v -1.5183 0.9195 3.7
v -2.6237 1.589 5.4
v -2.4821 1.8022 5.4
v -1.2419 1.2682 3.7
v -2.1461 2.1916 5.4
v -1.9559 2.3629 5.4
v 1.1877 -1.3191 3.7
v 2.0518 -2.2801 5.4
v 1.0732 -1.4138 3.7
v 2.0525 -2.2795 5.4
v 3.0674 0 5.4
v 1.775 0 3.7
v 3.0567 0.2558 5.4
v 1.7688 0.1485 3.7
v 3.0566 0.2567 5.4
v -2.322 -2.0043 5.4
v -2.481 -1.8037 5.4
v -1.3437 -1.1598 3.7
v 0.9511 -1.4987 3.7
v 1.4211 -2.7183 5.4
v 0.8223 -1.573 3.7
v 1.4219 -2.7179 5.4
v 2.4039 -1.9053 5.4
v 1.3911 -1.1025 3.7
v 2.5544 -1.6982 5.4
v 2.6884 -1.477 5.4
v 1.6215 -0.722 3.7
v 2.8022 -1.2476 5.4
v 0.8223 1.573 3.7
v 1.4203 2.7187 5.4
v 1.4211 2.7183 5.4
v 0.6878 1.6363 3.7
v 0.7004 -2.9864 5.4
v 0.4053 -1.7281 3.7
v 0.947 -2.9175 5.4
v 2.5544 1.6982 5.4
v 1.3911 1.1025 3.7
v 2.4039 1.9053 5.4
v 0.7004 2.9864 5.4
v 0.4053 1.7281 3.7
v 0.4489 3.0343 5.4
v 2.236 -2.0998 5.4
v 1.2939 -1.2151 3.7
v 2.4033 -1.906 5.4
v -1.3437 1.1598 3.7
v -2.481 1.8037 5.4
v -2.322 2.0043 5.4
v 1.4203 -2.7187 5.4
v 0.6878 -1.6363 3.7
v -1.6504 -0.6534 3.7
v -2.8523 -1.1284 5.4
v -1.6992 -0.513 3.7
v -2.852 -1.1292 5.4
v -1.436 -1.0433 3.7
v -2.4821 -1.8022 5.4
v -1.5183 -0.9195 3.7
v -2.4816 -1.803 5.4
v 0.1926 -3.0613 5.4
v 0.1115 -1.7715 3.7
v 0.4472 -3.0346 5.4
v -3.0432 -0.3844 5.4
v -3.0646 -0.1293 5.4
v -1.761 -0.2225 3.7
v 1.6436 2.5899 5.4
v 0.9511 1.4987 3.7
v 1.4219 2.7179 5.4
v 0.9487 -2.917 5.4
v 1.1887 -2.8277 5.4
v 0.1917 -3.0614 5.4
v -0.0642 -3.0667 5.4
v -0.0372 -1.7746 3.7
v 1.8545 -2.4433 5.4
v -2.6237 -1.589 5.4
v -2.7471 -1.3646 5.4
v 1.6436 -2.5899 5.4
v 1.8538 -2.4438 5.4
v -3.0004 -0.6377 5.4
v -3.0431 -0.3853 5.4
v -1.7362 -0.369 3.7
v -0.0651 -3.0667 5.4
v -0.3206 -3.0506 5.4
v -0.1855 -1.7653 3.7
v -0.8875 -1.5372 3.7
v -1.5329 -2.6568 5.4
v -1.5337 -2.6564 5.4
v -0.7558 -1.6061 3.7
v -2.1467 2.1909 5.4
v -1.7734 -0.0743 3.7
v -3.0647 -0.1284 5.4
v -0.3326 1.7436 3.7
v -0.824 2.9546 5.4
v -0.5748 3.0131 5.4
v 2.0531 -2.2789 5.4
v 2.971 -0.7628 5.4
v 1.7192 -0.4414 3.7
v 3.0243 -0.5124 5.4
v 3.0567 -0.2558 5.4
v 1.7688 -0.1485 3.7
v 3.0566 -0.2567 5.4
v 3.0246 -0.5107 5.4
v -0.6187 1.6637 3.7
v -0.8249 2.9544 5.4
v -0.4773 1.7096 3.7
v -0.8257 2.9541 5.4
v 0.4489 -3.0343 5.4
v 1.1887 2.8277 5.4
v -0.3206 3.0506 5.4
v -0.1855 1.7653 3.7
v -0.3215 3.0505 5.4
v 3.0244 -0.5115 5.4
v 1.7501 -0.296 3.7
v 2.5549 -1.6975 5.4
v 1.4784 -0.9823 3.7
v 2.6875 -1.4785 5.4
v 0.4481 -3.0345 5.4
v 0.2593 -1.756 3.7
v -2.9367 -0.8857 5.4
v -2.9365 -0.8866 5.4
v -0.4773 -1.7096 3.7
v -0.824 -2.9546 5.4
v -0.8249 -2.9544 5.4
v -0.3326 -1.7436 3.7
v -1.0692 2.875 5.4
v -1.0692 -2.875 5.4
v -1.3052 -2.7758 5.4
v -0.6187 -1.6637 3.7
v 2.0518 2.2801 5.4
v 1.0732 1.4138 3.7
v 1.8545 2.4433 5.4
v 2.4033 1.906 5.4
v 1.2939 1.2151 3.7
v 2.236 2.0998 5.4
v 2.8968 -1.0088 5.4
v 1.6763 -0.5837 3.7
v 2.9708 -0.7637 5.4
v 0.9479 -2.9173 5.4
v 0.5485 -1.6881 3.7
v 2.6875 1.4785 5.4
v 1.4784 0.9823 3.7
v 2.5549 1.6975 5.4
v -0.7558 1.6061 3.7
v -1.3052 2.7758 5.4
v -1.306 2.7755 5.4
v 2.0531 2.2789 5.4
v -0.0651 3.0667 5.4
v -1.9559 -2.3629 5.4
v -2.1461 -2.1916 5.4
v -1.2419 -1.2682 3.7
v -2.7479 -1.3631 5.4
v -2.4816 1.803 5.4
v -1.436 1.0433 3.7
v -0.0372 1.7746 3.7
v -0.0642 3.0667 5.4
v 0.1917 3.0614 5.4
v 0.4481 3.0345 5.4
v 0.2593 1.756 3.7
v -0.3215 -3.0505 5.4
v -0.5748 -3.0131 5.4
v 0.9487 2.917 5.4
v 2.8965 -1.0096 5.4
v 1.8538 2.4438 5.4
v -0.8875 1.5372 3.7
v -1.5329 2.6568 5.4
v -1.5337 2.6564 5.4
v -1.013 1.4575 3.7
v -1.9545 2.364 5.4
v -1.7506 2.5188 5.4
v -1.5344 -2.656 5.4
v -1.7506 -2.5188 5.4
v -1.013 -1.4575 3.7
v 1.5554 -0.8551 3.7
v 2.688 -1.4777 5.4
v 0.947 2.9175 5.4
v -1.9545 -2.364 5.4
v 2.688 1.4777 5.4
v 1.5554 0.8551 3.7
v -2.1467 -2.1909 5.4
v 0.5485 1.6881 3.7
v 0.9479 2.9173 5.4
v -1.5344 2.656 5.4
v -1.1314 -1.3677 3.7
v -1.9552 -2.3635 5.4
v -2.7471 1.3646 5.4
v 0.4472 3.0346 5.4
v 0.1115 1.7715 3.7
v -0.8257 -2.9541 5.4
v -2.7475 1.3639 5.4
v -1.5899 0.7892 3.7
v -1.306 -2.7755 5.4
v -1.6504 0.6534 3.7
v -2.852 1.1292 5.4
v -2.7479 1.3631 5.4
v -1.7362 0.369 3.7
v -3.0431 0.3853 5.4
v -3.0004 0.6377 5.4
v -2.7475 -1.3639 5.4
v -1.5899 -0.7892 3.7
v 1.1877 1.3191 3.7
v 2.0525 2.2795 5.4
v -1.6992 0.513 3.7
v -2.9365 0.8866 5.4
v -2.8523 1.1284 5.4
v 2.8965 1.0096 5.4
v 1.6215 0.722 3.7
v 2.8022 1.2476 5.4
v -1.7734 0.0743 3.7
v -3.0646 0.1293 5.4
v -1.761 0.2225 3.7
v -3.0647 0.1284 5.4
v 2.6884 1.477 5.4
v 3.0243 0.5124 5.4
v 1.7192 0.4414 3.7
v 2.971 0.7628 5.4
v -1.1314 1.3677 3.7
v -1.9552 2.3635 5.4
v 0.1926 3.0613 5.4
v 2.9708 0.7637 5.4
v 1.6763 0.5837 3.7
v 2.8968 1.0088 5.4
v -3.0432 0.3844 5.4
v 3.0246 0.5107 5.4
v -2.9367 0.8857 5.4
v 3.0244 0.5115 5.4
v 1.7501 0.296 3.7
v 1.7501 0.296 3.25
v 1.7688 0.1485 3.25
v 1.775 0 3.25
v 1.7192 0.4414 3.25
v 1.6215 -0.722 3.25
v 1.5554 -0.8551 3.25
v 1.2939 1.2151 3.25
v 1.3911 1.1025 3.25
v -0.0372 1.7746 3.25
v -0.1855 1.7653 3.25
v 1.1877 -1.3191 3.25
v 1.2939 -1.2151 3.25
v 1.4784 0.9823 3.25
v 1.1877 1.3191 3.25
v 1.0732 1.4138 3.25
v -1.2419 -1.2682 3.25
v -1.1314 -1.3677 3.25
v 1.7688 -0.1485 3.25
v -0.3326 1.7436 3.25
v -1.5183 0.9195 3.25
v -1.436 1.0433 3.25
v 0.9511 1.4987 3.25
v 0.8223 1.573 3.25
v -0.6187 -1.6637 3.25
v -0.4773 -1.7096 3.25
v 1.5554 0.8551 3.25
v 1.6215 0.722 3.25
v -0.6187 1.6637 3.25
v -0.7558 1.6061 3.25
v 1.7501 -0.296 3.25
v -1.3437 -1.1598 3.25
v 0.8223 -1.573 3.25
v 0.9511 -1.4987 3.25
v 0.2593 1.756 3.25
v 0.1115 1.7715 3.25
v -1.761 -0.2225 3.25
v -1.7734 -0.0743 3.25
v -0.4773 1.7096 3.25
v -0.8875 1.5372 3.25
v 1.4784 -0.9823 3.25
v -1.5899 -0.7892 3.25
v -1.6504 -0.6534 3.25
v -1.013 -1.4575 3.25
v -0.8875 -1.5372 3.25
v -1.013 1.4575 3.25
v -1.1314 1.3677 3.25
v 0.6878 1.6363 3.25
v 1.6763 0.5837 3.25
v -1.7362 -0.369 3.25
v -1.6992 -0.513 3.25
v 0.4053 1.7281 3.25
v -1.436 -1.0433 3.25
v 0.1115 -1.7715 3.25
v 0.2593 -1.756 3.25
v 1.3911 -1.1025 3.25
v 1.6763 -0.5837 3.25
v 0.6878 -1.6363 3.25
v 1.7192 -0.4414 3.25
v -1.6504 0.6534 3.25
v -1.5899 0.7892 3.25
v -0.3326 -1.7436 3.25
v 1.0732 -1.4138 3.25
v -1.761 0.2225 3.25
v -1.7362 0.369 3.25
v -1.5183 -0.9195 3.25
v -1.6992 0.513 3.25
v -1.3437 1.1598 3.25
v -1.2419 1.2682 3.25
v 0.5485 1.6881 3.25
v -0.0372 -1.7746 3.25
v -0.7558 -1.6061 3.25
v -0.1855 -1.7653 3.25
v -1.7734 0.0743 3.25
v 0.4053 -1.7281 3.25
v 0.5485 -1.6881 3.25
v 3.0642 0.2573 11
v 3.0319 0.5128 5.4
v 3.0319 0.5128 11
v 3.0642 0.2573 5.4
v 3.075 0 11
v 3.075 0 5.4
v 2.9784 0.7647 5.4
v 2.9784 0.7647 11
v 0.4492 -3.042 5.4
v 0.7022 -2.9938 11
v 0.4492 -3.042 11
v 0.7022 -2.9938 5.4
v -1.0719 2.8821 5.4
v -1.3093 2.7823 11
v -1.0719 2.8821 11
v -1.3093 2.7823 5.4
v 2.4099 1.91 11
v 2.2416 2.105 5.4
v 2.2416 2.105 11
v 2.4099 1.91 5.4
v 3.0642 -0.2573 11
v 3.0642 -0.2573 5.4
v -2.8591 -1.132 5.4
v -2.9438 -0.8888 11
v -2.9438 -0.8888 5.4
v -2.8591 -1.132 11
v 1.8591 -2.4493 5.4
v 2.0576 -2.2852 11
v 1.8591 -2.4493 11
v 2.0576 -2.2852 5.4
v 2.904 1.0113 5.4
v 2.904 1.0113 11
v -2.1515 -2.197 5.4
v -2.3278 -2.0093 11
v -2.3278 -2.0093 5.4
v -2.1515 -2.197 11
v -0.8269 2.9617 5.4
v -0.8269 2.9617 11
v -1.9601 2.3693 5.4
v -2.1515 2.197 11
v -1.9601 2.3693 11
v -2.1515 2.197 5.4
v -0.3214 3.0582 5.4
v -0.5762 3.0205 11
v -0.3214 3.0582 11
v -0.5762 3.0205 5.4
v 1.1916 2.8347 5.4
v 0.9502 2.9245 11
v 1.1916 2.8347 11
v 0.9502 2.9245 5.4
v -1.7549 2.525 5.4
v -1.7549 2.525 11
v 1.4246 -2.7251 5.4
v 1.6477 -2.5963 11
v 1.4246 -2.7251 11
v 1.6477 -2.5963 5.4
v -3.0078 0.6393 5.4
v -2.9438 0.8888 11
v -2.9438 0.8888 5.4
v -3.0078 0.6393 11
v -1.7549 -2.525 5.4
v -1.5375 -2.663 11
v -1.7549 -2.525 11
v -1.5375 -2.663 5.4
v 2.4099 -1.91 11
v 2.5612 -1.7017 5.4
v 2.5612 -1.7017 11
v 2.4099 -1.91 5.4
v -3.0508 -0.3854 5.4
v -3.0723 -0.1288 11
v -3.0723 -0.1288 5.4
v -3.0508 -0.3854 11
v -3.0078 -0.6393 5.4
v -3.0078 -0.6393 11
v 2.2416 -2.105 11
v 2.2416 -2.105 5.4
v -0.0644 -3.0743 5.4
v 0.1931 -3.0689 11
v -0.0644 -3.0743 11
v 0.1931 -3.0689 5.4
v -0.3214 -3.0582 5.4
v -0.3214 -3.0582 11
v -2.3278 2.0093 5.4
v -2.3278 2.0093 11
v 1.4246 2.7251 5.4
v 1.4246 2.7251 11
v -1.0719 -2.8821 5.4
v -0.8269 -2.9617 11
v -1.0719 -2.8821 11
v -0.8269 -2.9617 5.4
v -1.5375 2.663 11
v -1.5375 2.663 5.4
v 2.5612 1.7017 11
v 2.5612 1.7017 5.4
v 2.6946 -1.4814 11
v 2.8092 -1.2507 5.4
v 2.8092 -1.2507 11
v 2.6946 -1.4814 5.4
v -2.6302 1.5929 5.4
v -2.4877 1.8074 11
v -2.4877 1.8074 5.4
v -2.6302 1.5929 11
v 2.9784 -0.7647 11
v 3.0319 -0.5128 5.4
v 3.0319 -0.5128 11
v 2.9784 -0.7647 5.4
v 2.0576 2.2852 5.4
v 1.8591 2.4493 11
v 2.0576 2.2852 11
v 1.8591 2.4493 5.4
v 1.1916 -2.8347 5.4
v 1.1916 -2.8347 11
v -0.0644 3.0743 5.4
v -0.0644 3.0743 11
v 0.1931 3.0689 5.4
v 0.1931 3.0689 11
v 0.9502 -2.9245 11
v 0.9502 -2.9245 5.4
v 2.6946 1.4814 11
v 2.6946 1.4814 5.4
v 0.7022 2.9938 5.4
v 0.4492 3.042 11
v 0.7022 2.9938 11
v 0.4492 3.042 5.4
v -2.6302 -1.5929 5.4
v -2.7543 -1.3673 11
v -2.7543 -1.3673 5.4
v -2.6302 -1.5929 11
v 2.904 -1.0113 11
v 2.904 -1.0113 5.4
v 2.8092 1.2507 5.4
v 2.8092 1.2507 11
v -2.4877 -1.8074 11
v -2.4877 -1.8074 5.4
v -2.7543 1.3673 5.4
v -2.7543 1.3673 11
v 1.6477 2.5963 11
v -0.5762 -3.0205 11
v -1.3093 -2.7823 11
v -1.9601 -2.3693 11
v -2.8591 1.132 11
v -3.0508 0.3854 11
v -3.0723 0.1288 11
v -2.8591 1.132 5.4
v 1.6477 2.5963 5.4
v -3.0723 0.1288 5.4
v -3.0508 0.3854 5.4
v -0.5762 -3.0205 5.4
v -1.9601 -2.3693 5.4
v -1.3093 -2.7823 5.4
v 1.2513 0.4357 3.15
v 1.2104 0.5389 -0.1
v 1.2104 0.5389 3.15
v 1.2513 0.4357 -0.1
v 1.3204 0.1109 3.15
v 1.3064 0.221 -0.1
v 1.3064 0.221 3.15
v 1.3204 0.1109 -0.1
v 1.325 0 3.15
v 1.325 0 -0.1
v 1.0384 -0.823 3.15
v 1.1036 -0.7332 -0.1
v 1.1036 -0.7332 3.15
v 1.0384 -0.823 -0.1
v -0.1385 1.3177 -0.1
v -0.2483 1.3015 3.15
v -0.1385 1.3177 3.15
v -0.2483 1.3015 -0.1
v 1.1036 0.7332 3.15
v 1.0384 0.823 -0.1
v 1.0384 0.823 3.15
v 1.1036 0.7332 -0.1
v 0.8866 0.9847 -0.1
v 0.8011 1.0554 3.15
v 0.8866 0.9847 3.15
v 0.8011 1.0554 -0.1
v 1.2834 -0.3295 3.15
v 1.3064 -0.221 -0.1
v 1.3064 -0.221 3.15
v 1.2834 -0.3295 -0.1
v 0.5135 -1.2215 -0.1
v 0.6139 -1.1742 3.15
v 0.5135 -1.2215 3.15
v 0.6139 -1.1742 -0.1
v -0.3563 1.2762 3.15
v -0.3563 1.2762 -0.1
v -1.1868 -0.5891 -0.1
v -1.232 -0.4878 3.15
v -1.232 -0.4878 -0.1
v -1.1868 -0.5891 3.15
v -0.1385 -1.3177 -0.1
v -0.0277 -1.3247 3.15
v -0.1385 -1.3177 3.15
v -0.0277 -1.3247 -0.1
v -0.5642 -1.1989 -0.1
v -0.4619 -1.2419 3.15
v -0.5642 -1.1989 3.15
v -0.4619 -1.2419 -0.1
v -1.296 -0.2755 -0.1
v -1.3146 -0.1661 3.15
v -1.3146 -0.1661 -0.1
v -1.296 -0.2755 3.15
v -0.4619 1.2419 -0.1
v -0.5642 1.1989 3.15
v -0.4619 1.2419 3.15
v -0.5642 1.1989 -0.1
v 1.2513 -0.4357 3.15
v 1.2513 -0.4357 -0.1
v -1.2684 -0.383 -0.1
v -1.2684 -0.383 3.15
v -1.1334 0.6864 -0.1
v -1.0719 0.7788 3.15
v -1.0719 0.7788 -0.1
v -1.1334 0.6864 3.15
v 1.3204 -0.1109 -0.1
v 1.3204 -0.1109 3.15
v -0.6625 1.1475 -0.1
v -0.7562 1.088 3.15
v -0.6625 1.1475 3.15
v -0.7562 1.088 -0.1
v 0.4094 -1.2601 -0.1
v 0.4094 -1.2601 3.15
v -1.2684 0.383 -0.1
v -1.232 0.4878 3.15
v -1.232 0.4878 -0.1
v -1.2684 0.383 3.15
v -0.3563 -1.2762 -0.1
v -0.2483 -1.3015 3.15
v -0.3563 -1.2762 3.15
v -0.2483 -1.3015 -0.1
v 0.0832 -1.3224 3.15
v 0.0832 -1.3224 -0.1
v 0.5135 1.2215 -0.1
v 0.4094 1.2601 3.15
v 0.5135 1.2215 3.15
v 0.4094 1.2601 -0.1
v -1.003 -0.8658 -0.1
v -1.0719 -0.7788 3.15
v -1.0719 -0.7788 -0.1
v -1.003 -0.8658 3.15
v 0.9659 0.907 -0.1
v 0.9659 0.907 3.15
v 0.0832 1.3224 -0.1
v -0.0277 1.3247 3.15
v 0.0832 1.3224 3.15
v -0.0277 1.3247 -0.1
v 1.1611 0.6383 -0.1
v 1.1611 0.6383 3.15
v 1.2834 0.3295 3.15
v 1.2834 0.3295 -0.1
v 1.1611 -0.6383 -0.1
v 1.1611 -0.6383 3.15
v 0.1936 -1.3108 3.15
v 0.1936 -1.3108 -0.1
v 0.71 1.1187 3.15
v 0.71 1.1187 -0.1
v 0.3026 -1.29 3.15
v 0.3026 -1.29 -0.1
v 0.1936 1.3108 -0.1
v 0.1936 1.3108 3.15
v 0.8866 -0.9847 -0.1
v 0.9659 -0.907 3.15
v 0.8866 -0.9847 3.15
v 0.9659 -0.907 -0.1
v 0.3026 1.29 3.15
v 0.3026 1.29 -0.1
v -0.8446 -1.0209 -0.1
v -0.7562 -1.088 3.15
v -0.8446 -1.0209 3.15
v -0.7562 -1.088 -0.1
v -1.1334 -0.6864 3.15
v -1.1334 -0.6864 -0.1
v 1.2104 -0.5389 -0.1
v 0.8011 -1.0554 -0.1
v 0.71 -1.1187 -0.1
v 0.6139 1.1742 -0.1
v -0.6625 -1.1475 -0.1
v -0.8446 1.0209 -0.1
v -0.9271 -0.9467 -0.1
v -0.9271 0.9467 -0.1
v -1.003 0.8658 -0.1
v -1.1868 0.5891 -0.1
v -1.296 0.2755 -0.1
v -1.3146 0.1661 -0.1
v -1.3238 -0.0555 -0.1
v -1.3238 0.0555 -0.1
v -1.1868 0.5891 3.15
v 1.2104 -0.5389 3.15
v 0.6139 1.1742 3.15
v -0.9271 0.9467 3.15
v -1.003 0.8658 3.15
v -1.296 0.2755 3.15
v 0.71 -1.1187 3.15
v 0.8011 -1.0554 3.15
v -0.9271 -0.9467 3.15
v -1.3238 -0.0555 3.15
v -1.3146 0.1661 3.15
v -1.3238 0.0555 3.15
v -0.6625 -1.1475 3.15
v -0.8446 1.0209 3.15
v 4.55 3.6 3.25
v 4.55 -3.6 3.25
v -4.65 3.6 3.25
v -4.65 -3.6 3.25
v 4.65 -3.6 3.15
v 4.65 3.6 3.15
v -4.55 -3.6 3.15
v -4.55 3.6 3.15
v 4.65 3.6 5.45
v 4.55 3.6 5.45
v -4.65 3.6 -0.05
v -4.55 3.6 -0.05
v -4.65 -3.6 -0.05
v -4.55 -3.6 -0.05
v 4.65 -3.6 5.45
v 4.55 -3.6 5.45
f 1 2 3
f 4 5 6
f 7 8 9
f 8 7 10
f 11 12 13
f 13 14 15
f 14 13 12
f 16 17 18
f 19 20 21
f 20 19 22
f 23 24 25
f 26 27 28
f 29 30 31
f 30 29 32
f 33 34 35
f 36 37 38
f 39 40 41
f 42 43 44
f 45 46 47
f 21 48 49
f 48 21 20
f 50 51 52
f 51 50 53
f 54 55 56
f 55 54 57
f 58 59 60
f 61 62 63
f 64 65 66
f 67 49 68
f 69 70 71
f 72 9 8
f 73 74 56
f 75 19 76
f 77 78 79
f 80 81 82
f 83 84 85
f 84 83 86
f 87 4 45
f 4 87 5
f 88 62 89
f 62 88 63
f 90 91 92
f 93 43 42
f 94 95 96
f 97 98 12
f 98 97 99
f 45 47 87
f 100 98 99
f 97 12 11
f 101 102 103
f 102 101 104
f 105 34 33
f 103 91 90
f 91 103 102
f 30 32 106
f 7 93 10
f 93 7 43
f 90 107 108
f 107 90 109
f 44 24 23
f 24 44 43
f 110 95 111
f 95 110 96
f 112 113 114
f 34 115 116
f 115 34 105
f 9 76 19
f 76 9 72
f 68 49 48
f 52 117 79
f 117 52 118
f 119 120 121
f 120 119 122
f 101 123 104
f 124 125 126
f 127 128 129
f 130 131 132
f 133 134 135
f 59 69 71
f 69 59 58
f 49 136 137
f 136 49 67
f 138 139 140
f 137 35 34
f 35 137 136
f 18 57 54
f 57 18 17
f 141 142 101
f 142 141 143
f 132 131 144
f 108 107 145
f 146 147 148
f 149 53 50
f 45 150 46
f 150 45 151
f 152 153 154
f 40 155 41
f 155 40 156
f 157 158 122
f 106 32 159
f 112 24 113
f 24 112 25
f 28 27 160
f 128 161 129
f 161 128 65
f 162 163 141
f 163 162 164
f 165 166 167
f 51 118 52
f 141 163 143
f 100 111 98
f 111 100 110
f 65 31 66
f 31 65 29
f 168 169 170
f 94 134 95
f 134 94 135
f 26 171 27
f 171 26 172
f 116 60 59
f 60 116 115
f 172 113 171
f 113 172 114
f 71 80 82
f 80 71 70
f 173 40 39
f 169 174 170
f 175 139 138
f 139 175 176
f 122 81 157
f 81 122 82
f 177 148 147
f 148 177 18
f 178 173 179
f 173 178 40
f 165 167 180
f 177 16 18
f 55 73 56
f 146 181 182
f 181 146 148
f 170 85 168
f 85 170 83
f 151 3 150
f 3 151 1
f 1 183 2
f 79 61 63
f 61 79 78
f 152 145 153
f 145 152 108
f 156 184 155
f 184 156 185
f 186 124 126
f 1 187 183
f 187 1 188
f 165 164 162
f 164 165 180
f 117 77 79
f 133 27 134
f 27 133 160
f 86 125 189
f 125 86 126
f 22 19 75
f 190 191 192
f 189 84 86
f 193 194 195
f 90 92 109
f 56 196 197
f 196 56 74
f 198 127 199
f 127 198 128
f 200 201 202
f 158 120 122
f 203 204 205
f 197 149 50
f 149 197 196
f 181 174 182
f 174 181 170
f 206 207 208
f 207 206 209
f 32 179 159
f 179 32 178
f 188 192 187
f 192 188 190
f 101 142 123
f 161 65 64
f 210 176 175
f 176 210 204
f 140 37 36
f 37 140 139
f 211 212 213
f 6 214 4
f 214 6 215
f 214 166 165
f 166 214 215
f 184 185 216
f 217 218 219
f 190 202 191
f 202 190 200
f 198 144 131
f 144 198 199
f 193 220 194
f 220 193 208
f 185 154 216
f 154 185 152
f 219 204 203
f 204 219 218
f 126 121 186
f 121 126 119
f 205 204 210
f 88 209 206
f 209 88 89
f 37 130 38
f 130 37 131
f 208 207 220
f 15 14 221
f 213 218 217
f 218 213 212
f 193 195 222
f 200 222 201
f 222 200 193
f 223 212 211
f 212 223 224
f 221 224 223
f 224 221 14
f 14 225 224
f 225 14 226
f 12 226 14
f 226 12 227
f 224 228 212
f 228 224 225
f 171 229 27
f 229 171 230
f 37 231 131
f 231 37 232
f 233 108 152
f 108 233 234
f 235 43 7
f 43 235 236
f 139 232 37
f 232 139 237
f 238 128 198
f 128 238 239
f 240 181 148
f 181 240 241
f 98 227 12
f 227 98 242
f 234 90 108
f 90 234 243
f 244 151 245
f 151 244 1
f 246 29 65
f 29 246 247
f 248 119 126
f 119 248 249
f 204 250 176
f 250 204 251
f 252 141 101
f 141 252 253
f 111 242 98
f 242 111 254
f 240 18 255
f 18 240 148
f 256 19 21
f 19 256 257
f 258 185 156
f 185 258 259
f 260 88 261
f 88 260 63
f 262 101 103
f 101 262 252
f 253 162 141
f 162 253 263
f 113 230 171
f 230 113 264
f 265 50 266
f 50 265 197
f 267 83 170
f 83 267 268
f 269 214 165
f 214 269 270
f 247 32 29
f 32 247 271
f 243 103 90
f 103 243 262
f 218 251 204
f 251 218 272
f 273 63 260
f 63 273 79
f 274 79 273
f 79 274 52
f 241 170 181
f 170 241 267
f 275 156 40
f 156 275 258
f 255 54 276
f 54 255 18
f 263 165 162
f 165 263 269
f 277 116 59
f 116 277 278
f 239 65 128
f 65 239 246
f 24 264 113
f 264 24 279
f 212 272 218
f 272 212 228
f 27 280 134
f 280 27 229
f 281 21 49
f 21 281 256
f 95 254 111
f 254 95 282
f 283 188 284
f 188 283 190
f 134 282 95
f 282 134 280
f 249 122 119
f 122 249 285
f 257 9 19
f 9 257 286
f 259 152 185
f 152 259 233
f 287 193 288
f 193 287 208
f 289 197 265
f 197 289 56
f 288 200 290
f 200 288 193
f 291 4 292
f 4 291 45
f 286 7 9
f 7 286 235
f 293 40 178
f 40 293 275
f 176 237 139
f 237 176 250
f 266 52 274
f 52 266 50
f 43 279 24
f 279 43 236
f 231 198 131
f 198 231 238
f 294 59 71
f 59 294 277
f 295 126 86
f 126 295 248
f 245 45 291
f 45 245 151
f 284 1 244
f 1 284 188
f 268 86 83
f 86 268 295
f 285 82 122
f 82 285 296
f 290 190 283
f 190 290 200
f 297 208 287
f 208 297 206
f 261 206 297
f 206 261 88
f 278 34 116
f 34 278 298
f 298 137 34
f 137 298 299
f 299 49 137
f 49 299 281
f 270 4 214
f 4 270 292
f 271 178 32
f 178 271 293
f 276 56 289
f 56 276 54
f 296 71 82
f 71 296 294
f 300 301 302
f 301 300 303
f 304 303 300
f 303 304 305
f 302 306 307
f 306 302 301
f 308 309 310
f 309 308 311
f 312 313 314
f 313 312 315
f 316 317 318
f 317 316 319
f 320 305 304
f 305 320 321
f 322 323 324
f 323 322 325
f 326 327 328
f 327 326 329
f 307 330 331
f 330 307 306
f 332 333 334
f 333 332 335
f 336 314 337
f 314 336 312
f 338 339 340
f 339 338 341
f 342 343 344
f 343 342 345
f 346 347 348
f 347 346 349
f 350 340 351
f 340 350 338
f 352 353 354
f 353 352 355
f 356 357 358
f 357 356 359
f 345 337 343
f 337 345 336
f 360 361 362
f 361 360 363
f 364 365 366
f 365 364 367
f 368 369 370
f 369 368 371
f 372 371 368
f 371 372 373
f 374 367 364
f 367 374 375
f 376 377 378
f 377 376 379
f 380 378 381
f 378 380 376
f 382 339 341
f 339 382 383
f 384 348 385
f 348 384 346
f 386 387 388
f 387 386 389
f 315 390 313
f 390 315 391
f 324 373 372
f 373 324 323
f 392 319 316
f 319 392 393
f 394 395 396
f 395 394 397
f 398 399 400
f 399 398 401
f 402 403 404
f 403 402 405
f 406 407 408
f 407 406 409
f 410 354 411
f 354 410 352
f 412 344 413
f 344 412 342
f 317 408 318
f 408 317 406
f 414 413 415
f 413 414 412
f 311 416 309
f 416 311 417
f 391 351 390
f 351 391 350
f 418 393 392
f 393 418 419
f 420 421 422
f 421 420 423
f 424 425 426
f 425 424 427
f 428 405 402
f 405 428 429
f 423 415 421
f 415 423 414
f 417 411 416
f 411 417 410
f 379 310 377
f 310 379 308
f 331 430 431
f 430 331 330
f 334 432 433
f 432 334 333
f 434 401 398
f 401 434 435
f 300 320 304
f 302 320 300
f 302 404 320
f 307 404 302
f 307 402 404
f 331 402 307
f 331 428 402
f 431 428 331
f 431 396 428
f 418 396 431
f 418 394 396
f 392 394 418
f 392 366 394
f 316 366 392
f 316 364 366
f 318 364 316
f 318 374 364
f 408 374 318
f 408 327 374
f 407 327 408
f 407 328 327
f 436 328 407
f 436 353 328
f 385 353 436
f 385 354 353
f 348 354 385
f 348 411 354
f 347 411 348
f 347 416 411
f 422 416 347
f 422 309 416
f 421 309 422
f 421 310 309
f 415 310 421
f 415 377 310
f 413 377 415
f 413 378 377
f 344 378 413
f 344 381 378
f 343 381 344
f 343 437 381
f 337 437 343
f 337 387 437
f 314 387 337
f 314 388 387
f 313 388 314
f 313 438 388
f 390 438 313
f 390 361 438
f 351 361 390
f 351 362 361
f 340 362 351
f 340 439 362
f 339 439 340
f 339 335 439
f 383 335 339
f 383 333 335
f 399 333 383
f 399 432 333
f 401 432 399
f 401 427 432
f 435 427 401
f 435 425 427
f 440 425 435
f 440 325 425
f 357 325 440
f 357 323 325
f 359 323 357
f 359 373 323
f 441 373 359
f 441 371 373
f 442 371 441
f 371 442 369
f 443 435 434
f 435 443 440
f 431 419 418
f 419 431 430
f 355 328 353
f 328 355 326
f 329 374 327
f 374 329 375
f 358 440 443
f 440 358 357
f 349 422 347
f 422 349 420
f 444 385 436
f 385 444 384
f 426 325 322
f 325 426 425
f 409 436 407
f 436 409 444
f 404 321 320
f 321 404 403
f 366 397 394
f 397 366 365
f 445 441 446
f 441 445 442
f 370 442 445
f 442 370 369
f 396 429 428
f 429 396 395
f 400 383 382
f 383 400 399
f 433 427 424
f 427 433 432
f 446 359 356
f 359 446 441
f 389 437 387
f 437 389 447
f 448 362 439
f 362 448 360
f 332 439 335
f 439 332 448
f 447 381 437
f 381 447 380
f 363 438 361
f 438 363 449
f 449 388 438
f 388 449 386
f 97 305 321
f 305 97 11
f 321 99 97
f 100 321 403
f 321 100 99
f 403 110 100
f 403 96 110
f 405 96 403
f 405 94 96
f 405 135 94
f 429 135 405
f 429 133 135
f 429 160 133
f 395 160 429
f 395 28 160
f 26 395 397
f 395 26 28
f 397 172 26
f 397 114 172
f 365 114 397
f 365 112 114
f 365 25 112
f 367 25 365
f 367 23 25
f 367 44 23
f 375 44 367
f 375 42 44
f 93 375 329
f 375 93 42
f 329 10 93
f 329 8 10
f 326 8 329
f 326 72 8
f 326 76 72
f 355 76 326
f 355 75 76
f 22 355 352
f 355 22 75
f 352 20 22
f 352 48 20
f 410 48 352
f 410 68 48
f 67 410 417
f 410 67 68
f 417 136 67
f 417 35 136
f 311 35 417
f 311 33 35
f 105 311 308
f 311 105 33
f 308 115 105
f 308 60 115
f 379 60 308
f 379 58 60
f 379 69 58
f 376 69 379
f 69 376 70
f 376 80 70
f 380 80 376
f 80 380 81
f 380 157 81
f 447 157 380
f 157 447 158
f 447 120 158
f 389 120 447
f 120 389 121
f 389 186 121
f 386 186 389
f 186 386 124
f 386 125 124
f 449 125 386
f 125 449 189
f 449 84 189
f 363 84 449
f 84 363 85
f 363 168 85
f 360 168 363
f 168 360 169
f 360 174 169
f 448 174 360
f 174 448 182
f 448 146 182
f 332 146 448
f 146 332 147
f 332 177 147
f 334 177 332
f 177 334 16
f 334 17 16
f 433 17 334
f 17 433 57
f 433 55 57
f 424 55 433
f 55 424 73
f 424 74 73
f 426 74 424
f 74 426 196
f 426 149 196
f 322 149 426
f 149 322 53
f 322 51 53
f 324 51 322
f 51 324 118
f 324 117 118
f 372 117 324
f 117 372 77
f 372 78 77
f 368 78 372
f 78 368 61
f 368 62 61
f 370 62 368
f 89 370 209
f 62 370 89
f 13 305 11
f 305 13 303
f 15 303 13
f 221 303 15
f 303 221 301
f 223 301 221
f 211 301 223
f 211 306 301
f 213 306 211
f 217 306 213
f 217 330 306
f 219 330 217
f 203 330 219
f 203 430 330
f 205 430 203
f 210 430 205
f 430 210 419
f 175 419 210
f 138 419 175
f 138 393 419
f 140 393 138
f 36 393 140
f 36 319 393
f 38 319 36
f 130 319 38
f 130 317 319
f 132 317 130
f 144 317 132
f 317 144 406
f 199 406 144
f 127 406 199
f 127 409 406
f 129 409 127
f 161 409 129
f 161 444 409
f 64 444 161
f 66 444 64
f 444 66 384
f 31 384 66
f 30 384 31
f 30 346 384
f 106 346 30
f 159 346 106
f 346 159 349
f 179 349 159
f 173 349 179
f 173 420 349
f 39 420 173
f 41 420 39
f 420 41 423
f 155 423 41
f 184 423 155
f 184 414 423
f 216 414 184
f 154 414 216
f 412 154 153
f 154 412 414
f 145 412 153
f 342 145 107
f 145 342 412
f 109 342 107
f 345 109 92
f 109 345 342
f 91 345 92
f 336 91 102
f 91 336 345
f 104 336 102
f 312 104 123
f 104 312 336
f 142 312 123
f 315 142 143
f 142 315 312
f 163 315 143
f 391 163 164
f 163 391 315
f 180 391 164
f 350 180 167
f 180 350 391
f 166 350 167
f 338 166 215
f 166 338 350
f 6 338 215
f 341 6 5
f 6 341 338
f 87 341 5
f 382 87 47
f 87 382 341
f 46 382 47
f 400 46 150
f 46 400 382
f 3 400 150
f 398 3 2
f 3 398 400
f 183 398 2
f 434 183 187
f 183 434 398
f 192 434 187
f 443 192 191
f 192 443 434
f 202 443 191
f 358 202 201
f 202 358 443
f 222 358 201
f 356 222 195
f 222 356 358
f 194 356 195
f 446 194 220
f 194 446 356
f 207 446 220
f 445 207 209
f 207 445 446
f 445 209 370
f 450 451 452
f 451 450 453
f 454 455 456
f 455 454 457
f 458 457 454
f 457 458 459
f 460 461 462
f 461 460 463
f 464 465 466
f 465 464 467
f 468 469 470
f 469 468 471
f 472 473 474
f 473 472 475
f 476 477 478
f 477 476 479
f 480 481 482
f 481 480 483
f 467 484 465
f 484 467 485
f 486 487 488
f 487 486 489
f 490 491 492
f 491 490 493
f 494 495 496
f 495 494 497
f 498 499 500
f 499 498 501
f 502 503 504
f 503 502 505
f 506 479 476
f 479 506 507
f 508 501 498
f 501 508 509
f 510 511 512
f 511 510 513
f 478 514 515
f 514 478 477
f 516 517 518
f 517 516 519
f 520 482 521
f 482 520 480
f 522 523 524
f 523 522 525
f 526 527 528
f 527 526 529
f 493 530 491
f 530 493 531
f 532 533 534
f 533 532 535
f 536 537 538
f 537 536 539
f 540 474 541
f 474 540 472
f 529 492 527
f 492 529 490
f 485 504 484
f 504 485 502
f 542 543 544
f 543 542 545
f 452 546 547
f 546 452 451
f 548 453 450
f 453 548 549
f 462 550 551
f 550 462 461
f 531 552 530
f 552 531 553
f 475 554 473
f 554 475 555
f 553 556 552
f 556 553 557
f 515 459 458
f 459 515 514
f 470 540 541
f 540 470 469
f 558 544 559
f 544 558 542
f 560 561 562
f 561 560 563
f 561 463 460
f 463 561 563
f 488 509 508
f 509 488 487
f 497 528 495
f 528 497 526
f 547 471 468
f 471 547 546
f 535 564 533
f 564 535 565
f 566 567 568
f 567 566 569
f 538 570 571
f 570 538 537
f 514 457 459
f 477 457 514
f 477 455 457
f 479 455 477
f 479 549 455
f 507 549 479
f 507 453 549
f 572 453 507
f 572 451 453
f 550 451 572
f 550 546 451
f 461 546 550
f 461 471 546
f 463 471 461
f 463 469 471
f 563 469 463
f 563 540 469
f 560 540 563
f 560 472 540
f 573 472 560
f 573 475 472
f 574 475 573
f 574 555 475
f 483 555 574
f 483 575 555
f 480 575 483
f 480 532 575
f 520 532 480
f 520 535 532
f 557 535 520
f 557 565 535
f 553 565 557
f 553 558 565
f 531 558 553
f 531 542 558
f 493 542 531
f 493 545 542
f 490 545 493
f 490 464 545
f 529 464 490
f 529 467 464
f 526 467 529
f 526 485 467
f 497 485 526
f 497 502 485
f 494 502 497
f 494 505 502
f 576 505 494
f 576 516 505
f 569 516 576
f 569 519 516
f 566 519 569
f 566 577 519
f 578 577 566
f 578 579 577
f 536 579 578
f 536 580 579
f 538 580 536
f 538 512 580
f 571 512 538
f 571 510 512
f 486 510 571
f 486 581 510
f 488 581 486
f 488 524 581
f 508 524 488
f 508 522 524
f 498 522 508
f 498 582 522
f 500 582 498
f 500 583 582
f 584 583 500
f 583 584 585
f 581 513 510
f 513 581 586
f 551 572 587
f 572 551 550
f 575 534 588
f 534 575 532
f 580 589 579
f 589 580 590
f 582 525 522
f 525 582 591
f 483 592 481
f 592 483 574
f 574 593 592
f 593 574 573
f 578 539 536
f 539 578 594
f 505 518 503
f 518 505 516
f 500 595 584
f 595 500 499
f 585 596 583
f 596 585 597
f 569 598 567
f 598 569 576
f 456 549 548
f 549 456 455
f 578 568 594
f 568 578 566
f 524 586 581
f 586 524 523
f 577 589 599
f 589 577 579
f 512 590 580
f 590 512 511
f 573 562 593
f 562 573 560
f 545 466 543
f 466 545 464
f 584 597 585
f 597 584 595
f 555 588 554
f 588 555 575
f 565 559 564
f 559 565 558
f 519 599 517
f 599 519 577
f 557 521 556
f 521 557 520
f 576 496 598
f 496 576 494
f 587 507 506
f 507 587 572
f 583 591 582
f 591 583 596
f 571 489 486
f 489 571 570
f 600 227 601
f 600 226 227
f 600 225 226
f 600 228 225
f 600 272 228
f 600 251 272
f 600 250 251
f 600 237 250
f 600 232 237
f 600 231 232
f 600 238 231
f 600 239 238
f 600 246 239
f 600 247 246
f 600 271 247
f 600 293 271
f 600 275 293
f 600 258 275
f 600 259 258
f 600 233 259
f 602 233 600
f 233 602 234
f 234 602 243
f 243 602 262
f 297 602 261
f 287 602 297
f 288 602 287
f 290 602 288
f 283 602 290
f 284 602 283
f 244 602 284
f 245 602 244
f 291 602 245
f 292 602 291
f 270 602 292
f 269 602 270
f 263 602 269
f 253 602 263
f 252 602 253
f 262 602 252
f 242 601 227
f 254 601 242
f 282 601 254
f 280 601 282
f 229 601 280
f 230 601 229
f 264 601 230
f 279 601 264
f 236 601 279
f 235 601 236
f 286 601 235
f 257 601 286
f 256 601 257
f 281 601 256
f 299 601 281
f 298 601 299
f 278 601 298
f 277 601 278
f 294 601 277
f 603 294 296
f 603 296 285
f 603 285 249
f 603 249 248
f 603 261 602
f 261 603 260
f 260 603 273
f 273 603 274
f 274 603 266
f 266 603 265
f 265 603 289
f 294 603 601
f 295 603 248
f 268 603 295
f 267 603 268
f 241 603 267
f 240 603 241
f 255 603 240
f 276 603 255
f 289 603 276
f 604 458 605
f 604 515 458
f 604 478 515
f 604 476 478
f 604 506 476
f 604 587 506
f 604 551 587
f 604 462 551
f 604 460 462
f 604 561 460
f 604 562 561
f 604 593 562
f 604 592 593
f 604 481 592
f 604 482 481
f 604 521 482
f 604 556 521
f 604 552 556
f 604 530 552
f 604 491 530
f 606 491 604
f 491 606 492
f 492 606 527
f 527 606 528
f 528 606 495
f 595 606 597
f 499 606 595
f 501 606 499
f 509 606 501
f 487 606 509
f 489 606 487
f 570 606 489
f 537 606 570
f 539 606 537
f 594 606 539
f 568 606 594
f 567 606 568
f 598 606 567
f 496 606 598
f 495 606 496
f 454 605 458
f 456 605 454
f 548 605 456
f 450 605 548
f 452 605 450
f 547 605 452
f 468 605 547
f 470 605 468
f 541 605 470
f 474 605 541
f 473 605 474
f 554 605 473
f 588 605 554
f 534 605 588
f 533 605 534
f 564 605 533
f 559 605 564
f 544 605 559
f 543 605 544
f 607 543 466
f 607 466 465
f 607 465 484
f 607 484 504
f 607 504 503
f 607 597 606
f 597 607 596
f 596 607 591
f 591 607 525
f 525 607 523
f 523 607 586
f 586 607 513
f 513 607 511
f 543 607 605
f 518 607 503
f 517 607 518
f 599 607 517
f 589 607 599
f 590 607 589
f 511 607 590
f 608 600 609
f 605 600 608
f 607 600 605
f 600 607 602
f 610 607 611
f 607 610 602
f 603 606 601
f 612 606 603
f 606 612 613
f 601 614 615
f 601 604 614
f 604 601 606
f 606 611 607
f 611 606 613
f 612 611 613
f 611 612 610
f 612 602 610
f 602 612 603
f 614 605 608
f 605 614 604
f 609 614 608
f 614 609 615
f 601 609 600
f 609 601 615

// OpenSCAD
// file: Screw.scad
// created by IndiePandaaaaa | Lukas

TOLERANCE = .1;
$fn = $preview ? 30 : 75;

// metric standards                          M1   M2   M3   M4   M5 M6 M7   M8   M9  M10
function screw_metric_corehole(standard) = [.75, 1.6, 2.5, 3.3, 4.2, 5, 6, 6.8, 7.8, 8.5][standard - 1];
function screw_metric_borehole(standard) = [0, 0, 3.4, 4.5, 5.5, 6.6, 0, 9, 0, 11][standard - 1];
function screw_metric_countersunk_height(standard) = [0, 0, 1.7, 2.3, 2.8, 3.3, 0, 4.4, 0, 5.5][standard - 1];
function screw_metric_countersunk_od(standard) = standard * 2;

module screw_metric_countersunk(standard, length, unthreaded_length = 0, borehole_length = 0, tolerance = .15) {
  if (screw_metric_corehole(standard=standard) == 0) echo("ERROR: screw_metric_corehole value has not been set yet.");
  if (screw_metric_borehole(standard=standard) == 0) echo("ERROR: screw_metric_borehole value has not been set yet.");
  if (screw_metric_countersunk_height(standard=standard) == 0) echo("ERROR: screw_metric_countersunk_height value has not been set yet.");

  union() {
    translate(v=[0, 0, -.1]) {
      cylinder(h=.2 + borehole_length, d=screw_metric_countersunk_od(standard) + tolerance, center=false);
      translate(v=[0, 0, -screw_metric_countersunk_height(standard)]) {
        cylinder(h=screw_metric_countersunk_height(standard) + .01, d2=screw_metric_countersunk_od(standard) + tolerance, d1=screw_metric_borehole(standard) + tolerance, center=false);
        translate(v=[0, 0, -.1]) cylinder(h=.1, d=screw_metric_borehole(standard) + tolerance, center=false);
      }
    }
    translate(v=[0, 0, -length]) cylinder(h=length, d=screw_metric_corehole(standard) + tolerance, center=false);

    // unthreaded part
    translate(v=[0, 0, -.1 - screw_metric_countersunk_height(standard) - unthreaded_length]) cylinder(h=unthreaded_length + .1, d=screw_metric_borehole(standard) + tolerance, center=false);
  }
}

// TODO: module metric cylindric head screws

// TODO: module metric rounded head screws

function screw_wood_corehole(diameter) = diameter * 0.75;
function screw_wood_borehole(diameter) = diameter * 1.25;
function screw_wood_countersunk_height(diameter) = diameter * 0.75;

module screw_wood_countersunk(diameter, length, unthreaded_length = 0, tolerance = .15) {
  if (screw_metric_corehole(standard=standard) == 0) echo("ERROR: screw_metric_corehole value has not been set yet.");
  if (screw_metric_borehole(standard=standard) == 0) echo("ERROR: screw_metric_borehole value has not been set yet.");
  if (screw_metric_countersunk_height(standard=standard) == 0) echo("ERROR: screw_metric_countersunk_height value has not been set yet.");

  // TODO: add module for wood screws 
  union(){}
}

// TODO: module wood cylindric head screws

// TODO: module wood rounded head screws

function cone_diameter(diameter) = diameter * 2;
function cone_diameter_cutout(diameter) = diameter * 2 + 0.5;
function cone_height(diameter) = diameter * 0.75;

module screw(diameter, length = 12, cutout_sample = false) {
  module base_model(diameter, length, cone_height, cone_diameter, offset = 0) {
    rotate_extrude(angle=360) {
      polygon(
        [
          [0, 0],
          [(diameter + offset) / 2, 0],
          [(diameter + offset) / 2, (length + offset) - (cone_height + offset)],
          [(cone_diameter + offset) / 2, length + offset],
          [0, length + offset],
        ]
      );
    }
  }

  if (length < diameter) {
    echo("Screw is too short");
    length = diameter + 5;
    echo("New length is: ", length);
  }

  if (!cutout_sample) {
    translate([0, 0, -length])
      difference() {
        base_model(diameter, length, cone_height(diameter), cone_diameter(diameter));

        // top cross part
        translate([0, 0, length - (cone_height(diameter) - diameter / 2) + .1])
          difference() {
            rotate([0, 0, 45])
              rotate_extrude(angle=360) {
                polygon(
                  [
                    [0, 0],
                    [diameter * 1.4 / 2, 0],
                    [cone_diameter(diameter) / 3, cone_height(diameter) - diameter / 2],
                    [0, cone_height(diameter) - diameter / 2],
                  ]
                );
              }
            for (i = [0:1:3]) {
              rotate([0, 0, 90 * i])
                translate([diameter / 3.18 / 2, diameter / 3.18 / 2, 0]) cube(cone_height(diameter));
            }
          }
      }
  } else {
    offset = 0;
    diameter = cone_diameter_cutout(diameter) / 2; // is duplicated by function, used to reduce error
    translate([0, 0, -length - offset / 2]) {
      base_model(diameter, length, cone_height(diameter), cone_diameter(diameter), offset);
      translate([0, 0, length - .005]) cylinder(r=diameter, h=50);
    }
  }
}

module screw_corehole(diameter_screw, diameter_core, unthreaded_length, length = 12) {
  union() {
    screw(diameter=diameter_screw, length=unthreaded_length, cutout_sample=true);
    if (unthreaded_length < diameter_core - .1) {
      translate(v=[0, 0, -diameter_screw * .8]) cylinder(h=diameter_screw, d=diameter_screw + .3, center=false);
    }
    translate([0, 0, -length]) cylinder(d=diameter_core, h=length - unthreaded_length + .1);
  }
}

module screw_with_nut_metric(screw_length, diameter, square_channel = false, tolerance = .1) {
  function od(width) = ( (width / 2) / cos(30)) * 2; // calculates nut diameter from given width
  nut_thickness = [0.8, 1.6, 2.4, 3.2, 4, 5, 5.5, 6.5];
  nut_width = [2.5, 4, 5.5, 7.1, 8.1, 10.1, 11.1, 13.1];

  if (!(0 < diameter && diameter <= 8 && diameter == round(diameter))) {
    echo("module is only defined for integer values from M1 to M8.");
  } else {
    union() {
      if (!square_channel) {
        screw(diameter=diameter, length=screw_length, cutout_sample=true);

        translate([0, 0, -(screw_length * 2 - nut_thickness[diameter - 1])])
          cylinder(d=od(nut_width[diameter - 1]) + tolerance, h=screw_length, $fn=6);
      } else {
        screw(diameter=diameter, length=screw_length + diameter, cutout_sample=true);
        translate([-od(nut_width[diameter - 1]) / 2 - tolerance, -(nut_width[diameter - 1] / 2), -(screw_length)])
          cube([od(nut_width[diameter - 1]) + screw_length, nut_width[diameter - 1] + tolerance, nut_thickness[diameter - 1] + tolerance]);
      }
    }
  }
}

translate(v=[0, 0, 0]) screw(diameter=3.5, length=12, cutout_sample=false);
translate(v=[20, 0, 0]) screw_corehole(diameter_screw=3, diameter_core=2.5, unthreaded_length=15, length=20);
translate(v=[40, 0, 0]) screw_with_nut(screw_length=30, diameter=4, square_channel=false, tolerance=.1);
translate(v=[60, 0, 0]) SCREW_METRIC_COUNTERSUNK(standard=3, length=12, unthreaded_length=5, borehole_length=5);
// main file
// created by Lukas|@IndiePandaaaaa
// encoding: utf-8

use <Screw.scad>

$fn = $preview ? 25 : 75;

function split_screw_material_height(screw_standard, material_thickness, unthreaded = .5) =
  material_thickness > screw_metric_countersunk_height(screw_standard) + screw_standard + unthreaded ?
    material_thickness
  : screw_metric_countersunk_height(screw_standard) + screw_standard + unthreaded;

function split_screw_distance(screw_standard) = screw_standard * 3;
function split_width(screw_standard, screw_count) = split_screw_distance(screw_standard) * screw_count + .2;

module split_with_screw_support(screw_standard, screw_count, material_thickness, material_width) {
  support_height = split_screw_material_height(screw_standard=screw_standard, material_thickness=material_thickness);
  support_width = split_width(screw_standard=screw_standard, screw_count=screw_count);

  translate(v=[-1.5, 0, support_height / 2]) cube(size=[support_width + 7, material_width, support_height], center=true);
}

module split_with_screw(screw_standard, screw_count, material_thickness, material_width, cut_thickness = .1, debug_mode = false) {
  sts_distance = split_screw_distance(screw_standard); // sts = screw to screw

  width = split_width(screw_standard, screw_count);
  height = split_screw_material_height(screw_standard, material_thickness) + .2;

  bottom_split_height = height - screw_metric_countersunk_height(screw_standard) - .5;
  top_split_height = height - bottom_split_height;

  screw_length_unthreaded = height - bottom_split_height - screw_metric_countersunk_height(screw_standard);
  screw_pos_first = -(width - .2) / 2 + sts_distance / 2;

  if (debug_mode) {
    echo("SplitToPrint: material height", height);
  }

  translate(v=[0, 0, bottom_split_height]) {
    union() {
      // planes
      cube(size=[width, material_width + .2, cut_thickness], center=true);
      translate(v=[-width / 2, 0, -bottom_split_height / 2])
        cube(size=[cut_thickness, material_width + .2, bottom_split_height + .1], center=true);
      translate(v=[width / 2, 0, top_split_height / 2])
        cube(size=[cut_thickness, material_width + .2, top_split_height + .1], center=true);

      // screws
      for (i = [0:screw_count - 1]) {
        translate(v=[screw_pos_first + i * sts_distance, 0, top_split_height + .1])
          screw_metric_countersunk(standard=screw_standard, length=height + .2, unthreaded_length=screw_length_unthreaded, borehole_length=height, tolerance=.15);
      }
    }
  }
}

split_with_screw(screw_standard=3, screw_count=1, material_thickness=3, material_width=7, cut_thickness=.1, debug_mode = true);
